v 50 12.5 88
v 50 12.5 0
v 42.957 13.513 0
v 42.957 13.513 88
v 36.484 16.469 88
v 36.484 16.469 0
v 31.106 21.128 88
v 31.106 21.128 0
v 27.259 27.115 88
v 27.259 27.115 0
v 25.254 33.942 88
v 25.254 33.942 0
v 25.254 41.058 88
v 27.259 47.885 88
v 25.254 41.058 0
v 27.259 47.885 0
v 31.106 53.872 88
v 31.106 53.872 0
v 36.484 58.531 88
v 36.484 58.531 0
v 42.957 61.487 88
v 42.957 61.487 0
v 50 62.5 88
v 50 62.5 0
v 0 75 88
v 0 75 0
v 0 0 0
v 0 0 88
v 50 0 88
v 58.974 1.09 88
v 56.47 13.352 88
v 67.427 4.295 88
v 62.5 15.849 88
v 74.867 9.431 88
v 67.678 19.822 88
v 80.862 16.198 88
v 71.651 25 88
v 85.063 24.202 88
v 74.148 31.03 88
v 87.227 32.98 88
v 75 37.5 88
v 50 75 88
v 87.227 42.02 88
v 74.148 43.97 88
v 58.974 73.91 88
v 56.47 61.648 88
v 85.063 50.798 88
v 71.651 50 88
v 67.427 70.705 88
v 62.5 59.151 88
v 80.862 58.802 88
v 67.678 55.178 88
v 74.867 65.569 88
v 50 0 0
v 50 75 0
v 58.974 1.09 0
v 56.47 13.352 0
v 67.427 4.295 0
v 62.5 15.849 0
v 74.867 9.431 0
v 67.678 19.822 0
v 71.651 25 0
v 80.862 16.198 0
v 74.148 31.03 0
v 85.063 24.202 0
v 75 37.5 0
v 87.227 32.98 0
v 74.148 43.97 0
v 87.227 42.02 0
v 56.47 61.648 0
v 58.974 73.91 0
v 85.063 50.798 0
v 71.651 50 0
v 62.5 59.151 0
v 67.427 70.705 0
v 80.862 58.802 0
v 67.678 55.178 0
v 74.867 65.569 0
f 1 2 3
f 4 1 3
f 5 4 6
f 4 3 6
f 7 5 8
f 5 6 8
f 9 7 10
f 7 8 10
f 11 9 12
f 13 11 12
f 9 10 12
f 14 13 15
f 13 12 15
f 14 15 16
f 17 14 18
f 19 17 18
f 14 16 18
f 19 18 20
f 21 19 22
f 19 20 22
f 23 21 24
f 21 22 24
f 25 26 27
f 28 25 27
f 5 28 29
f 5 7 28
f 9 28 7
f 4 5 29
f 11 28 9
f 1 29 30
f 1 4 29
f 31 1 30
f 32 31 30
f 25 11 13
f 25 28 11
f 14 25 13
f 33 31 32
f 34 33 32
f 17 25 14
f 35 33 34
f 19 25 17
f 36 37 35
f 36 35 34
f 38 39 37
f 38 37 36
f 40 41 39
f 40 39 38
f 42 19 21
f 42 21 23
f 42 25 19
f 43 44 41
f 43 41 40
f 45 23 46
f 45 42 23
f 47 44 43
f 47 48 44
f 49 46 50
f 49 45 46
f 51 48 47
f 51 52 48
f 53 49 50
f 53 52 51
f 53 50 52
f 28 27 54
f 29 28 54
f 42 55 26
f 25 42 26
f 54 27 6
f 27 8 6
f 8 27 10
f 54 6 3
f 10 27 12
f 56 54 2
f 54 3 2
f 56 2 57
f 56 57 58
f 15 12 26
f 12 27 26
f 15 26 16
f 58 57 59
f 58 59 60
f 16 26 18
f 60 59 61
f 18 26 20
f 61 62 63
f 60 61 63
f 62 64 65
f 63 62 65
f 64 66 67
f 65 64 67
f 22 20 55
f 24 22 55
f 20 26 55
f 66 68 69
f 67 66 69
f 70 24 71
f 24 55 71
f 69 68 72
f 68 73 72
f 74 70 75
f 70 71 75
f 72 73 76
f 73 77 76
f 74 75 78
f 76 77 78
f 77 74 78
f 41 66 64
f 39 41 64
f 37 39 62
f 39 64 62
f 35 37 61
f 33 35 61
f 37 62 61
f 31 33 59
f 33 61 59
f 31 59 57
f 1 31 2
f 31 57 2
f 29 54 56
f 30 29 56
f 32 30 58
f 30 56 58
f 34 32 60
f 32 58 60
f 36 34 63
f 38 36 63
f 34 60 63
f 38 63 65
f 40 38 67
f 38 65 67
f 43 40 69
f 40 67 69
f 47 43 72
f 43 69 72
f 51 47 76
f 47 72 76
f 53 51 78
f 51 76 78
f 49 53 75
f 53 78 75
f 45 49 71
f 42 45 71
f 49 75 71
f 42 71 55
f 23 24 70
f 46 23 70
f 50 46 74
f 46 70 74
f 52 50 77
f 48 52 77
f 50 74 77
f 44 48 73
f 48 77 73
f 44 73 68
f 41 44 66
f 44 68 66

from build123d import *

# Parameters (mm, degrees)
F1_DEPTH = 88


with BuildPart() as f1:
    # F0 (on Top) → F1 (new body)
    with BuildSketch(Plane.XY):
        with BuildLine():
            Line((0, 75), (0, 0))
            Line((0, 0), (50, 0))
            ThreePointArc((50, 0), (87.5, 37.5), (50, 75))
            Line((50, 75), (0, 75))
        make_face()
        with BuildLine():
            ThreePointArc((75, 37.5), (67.67767, 19.82233), (50, 12.5))
            ThreePointArc((50, 12.5), (25, 37.5), (50, 62.5))
            ThreePointArc((50, 62.5), (67.67767, 55.17767), (75, 37.5))
        make_face(mode=Mode.SUBTRACT)
    extrude(amount=F1_DEPTH)


solid = f1.part
